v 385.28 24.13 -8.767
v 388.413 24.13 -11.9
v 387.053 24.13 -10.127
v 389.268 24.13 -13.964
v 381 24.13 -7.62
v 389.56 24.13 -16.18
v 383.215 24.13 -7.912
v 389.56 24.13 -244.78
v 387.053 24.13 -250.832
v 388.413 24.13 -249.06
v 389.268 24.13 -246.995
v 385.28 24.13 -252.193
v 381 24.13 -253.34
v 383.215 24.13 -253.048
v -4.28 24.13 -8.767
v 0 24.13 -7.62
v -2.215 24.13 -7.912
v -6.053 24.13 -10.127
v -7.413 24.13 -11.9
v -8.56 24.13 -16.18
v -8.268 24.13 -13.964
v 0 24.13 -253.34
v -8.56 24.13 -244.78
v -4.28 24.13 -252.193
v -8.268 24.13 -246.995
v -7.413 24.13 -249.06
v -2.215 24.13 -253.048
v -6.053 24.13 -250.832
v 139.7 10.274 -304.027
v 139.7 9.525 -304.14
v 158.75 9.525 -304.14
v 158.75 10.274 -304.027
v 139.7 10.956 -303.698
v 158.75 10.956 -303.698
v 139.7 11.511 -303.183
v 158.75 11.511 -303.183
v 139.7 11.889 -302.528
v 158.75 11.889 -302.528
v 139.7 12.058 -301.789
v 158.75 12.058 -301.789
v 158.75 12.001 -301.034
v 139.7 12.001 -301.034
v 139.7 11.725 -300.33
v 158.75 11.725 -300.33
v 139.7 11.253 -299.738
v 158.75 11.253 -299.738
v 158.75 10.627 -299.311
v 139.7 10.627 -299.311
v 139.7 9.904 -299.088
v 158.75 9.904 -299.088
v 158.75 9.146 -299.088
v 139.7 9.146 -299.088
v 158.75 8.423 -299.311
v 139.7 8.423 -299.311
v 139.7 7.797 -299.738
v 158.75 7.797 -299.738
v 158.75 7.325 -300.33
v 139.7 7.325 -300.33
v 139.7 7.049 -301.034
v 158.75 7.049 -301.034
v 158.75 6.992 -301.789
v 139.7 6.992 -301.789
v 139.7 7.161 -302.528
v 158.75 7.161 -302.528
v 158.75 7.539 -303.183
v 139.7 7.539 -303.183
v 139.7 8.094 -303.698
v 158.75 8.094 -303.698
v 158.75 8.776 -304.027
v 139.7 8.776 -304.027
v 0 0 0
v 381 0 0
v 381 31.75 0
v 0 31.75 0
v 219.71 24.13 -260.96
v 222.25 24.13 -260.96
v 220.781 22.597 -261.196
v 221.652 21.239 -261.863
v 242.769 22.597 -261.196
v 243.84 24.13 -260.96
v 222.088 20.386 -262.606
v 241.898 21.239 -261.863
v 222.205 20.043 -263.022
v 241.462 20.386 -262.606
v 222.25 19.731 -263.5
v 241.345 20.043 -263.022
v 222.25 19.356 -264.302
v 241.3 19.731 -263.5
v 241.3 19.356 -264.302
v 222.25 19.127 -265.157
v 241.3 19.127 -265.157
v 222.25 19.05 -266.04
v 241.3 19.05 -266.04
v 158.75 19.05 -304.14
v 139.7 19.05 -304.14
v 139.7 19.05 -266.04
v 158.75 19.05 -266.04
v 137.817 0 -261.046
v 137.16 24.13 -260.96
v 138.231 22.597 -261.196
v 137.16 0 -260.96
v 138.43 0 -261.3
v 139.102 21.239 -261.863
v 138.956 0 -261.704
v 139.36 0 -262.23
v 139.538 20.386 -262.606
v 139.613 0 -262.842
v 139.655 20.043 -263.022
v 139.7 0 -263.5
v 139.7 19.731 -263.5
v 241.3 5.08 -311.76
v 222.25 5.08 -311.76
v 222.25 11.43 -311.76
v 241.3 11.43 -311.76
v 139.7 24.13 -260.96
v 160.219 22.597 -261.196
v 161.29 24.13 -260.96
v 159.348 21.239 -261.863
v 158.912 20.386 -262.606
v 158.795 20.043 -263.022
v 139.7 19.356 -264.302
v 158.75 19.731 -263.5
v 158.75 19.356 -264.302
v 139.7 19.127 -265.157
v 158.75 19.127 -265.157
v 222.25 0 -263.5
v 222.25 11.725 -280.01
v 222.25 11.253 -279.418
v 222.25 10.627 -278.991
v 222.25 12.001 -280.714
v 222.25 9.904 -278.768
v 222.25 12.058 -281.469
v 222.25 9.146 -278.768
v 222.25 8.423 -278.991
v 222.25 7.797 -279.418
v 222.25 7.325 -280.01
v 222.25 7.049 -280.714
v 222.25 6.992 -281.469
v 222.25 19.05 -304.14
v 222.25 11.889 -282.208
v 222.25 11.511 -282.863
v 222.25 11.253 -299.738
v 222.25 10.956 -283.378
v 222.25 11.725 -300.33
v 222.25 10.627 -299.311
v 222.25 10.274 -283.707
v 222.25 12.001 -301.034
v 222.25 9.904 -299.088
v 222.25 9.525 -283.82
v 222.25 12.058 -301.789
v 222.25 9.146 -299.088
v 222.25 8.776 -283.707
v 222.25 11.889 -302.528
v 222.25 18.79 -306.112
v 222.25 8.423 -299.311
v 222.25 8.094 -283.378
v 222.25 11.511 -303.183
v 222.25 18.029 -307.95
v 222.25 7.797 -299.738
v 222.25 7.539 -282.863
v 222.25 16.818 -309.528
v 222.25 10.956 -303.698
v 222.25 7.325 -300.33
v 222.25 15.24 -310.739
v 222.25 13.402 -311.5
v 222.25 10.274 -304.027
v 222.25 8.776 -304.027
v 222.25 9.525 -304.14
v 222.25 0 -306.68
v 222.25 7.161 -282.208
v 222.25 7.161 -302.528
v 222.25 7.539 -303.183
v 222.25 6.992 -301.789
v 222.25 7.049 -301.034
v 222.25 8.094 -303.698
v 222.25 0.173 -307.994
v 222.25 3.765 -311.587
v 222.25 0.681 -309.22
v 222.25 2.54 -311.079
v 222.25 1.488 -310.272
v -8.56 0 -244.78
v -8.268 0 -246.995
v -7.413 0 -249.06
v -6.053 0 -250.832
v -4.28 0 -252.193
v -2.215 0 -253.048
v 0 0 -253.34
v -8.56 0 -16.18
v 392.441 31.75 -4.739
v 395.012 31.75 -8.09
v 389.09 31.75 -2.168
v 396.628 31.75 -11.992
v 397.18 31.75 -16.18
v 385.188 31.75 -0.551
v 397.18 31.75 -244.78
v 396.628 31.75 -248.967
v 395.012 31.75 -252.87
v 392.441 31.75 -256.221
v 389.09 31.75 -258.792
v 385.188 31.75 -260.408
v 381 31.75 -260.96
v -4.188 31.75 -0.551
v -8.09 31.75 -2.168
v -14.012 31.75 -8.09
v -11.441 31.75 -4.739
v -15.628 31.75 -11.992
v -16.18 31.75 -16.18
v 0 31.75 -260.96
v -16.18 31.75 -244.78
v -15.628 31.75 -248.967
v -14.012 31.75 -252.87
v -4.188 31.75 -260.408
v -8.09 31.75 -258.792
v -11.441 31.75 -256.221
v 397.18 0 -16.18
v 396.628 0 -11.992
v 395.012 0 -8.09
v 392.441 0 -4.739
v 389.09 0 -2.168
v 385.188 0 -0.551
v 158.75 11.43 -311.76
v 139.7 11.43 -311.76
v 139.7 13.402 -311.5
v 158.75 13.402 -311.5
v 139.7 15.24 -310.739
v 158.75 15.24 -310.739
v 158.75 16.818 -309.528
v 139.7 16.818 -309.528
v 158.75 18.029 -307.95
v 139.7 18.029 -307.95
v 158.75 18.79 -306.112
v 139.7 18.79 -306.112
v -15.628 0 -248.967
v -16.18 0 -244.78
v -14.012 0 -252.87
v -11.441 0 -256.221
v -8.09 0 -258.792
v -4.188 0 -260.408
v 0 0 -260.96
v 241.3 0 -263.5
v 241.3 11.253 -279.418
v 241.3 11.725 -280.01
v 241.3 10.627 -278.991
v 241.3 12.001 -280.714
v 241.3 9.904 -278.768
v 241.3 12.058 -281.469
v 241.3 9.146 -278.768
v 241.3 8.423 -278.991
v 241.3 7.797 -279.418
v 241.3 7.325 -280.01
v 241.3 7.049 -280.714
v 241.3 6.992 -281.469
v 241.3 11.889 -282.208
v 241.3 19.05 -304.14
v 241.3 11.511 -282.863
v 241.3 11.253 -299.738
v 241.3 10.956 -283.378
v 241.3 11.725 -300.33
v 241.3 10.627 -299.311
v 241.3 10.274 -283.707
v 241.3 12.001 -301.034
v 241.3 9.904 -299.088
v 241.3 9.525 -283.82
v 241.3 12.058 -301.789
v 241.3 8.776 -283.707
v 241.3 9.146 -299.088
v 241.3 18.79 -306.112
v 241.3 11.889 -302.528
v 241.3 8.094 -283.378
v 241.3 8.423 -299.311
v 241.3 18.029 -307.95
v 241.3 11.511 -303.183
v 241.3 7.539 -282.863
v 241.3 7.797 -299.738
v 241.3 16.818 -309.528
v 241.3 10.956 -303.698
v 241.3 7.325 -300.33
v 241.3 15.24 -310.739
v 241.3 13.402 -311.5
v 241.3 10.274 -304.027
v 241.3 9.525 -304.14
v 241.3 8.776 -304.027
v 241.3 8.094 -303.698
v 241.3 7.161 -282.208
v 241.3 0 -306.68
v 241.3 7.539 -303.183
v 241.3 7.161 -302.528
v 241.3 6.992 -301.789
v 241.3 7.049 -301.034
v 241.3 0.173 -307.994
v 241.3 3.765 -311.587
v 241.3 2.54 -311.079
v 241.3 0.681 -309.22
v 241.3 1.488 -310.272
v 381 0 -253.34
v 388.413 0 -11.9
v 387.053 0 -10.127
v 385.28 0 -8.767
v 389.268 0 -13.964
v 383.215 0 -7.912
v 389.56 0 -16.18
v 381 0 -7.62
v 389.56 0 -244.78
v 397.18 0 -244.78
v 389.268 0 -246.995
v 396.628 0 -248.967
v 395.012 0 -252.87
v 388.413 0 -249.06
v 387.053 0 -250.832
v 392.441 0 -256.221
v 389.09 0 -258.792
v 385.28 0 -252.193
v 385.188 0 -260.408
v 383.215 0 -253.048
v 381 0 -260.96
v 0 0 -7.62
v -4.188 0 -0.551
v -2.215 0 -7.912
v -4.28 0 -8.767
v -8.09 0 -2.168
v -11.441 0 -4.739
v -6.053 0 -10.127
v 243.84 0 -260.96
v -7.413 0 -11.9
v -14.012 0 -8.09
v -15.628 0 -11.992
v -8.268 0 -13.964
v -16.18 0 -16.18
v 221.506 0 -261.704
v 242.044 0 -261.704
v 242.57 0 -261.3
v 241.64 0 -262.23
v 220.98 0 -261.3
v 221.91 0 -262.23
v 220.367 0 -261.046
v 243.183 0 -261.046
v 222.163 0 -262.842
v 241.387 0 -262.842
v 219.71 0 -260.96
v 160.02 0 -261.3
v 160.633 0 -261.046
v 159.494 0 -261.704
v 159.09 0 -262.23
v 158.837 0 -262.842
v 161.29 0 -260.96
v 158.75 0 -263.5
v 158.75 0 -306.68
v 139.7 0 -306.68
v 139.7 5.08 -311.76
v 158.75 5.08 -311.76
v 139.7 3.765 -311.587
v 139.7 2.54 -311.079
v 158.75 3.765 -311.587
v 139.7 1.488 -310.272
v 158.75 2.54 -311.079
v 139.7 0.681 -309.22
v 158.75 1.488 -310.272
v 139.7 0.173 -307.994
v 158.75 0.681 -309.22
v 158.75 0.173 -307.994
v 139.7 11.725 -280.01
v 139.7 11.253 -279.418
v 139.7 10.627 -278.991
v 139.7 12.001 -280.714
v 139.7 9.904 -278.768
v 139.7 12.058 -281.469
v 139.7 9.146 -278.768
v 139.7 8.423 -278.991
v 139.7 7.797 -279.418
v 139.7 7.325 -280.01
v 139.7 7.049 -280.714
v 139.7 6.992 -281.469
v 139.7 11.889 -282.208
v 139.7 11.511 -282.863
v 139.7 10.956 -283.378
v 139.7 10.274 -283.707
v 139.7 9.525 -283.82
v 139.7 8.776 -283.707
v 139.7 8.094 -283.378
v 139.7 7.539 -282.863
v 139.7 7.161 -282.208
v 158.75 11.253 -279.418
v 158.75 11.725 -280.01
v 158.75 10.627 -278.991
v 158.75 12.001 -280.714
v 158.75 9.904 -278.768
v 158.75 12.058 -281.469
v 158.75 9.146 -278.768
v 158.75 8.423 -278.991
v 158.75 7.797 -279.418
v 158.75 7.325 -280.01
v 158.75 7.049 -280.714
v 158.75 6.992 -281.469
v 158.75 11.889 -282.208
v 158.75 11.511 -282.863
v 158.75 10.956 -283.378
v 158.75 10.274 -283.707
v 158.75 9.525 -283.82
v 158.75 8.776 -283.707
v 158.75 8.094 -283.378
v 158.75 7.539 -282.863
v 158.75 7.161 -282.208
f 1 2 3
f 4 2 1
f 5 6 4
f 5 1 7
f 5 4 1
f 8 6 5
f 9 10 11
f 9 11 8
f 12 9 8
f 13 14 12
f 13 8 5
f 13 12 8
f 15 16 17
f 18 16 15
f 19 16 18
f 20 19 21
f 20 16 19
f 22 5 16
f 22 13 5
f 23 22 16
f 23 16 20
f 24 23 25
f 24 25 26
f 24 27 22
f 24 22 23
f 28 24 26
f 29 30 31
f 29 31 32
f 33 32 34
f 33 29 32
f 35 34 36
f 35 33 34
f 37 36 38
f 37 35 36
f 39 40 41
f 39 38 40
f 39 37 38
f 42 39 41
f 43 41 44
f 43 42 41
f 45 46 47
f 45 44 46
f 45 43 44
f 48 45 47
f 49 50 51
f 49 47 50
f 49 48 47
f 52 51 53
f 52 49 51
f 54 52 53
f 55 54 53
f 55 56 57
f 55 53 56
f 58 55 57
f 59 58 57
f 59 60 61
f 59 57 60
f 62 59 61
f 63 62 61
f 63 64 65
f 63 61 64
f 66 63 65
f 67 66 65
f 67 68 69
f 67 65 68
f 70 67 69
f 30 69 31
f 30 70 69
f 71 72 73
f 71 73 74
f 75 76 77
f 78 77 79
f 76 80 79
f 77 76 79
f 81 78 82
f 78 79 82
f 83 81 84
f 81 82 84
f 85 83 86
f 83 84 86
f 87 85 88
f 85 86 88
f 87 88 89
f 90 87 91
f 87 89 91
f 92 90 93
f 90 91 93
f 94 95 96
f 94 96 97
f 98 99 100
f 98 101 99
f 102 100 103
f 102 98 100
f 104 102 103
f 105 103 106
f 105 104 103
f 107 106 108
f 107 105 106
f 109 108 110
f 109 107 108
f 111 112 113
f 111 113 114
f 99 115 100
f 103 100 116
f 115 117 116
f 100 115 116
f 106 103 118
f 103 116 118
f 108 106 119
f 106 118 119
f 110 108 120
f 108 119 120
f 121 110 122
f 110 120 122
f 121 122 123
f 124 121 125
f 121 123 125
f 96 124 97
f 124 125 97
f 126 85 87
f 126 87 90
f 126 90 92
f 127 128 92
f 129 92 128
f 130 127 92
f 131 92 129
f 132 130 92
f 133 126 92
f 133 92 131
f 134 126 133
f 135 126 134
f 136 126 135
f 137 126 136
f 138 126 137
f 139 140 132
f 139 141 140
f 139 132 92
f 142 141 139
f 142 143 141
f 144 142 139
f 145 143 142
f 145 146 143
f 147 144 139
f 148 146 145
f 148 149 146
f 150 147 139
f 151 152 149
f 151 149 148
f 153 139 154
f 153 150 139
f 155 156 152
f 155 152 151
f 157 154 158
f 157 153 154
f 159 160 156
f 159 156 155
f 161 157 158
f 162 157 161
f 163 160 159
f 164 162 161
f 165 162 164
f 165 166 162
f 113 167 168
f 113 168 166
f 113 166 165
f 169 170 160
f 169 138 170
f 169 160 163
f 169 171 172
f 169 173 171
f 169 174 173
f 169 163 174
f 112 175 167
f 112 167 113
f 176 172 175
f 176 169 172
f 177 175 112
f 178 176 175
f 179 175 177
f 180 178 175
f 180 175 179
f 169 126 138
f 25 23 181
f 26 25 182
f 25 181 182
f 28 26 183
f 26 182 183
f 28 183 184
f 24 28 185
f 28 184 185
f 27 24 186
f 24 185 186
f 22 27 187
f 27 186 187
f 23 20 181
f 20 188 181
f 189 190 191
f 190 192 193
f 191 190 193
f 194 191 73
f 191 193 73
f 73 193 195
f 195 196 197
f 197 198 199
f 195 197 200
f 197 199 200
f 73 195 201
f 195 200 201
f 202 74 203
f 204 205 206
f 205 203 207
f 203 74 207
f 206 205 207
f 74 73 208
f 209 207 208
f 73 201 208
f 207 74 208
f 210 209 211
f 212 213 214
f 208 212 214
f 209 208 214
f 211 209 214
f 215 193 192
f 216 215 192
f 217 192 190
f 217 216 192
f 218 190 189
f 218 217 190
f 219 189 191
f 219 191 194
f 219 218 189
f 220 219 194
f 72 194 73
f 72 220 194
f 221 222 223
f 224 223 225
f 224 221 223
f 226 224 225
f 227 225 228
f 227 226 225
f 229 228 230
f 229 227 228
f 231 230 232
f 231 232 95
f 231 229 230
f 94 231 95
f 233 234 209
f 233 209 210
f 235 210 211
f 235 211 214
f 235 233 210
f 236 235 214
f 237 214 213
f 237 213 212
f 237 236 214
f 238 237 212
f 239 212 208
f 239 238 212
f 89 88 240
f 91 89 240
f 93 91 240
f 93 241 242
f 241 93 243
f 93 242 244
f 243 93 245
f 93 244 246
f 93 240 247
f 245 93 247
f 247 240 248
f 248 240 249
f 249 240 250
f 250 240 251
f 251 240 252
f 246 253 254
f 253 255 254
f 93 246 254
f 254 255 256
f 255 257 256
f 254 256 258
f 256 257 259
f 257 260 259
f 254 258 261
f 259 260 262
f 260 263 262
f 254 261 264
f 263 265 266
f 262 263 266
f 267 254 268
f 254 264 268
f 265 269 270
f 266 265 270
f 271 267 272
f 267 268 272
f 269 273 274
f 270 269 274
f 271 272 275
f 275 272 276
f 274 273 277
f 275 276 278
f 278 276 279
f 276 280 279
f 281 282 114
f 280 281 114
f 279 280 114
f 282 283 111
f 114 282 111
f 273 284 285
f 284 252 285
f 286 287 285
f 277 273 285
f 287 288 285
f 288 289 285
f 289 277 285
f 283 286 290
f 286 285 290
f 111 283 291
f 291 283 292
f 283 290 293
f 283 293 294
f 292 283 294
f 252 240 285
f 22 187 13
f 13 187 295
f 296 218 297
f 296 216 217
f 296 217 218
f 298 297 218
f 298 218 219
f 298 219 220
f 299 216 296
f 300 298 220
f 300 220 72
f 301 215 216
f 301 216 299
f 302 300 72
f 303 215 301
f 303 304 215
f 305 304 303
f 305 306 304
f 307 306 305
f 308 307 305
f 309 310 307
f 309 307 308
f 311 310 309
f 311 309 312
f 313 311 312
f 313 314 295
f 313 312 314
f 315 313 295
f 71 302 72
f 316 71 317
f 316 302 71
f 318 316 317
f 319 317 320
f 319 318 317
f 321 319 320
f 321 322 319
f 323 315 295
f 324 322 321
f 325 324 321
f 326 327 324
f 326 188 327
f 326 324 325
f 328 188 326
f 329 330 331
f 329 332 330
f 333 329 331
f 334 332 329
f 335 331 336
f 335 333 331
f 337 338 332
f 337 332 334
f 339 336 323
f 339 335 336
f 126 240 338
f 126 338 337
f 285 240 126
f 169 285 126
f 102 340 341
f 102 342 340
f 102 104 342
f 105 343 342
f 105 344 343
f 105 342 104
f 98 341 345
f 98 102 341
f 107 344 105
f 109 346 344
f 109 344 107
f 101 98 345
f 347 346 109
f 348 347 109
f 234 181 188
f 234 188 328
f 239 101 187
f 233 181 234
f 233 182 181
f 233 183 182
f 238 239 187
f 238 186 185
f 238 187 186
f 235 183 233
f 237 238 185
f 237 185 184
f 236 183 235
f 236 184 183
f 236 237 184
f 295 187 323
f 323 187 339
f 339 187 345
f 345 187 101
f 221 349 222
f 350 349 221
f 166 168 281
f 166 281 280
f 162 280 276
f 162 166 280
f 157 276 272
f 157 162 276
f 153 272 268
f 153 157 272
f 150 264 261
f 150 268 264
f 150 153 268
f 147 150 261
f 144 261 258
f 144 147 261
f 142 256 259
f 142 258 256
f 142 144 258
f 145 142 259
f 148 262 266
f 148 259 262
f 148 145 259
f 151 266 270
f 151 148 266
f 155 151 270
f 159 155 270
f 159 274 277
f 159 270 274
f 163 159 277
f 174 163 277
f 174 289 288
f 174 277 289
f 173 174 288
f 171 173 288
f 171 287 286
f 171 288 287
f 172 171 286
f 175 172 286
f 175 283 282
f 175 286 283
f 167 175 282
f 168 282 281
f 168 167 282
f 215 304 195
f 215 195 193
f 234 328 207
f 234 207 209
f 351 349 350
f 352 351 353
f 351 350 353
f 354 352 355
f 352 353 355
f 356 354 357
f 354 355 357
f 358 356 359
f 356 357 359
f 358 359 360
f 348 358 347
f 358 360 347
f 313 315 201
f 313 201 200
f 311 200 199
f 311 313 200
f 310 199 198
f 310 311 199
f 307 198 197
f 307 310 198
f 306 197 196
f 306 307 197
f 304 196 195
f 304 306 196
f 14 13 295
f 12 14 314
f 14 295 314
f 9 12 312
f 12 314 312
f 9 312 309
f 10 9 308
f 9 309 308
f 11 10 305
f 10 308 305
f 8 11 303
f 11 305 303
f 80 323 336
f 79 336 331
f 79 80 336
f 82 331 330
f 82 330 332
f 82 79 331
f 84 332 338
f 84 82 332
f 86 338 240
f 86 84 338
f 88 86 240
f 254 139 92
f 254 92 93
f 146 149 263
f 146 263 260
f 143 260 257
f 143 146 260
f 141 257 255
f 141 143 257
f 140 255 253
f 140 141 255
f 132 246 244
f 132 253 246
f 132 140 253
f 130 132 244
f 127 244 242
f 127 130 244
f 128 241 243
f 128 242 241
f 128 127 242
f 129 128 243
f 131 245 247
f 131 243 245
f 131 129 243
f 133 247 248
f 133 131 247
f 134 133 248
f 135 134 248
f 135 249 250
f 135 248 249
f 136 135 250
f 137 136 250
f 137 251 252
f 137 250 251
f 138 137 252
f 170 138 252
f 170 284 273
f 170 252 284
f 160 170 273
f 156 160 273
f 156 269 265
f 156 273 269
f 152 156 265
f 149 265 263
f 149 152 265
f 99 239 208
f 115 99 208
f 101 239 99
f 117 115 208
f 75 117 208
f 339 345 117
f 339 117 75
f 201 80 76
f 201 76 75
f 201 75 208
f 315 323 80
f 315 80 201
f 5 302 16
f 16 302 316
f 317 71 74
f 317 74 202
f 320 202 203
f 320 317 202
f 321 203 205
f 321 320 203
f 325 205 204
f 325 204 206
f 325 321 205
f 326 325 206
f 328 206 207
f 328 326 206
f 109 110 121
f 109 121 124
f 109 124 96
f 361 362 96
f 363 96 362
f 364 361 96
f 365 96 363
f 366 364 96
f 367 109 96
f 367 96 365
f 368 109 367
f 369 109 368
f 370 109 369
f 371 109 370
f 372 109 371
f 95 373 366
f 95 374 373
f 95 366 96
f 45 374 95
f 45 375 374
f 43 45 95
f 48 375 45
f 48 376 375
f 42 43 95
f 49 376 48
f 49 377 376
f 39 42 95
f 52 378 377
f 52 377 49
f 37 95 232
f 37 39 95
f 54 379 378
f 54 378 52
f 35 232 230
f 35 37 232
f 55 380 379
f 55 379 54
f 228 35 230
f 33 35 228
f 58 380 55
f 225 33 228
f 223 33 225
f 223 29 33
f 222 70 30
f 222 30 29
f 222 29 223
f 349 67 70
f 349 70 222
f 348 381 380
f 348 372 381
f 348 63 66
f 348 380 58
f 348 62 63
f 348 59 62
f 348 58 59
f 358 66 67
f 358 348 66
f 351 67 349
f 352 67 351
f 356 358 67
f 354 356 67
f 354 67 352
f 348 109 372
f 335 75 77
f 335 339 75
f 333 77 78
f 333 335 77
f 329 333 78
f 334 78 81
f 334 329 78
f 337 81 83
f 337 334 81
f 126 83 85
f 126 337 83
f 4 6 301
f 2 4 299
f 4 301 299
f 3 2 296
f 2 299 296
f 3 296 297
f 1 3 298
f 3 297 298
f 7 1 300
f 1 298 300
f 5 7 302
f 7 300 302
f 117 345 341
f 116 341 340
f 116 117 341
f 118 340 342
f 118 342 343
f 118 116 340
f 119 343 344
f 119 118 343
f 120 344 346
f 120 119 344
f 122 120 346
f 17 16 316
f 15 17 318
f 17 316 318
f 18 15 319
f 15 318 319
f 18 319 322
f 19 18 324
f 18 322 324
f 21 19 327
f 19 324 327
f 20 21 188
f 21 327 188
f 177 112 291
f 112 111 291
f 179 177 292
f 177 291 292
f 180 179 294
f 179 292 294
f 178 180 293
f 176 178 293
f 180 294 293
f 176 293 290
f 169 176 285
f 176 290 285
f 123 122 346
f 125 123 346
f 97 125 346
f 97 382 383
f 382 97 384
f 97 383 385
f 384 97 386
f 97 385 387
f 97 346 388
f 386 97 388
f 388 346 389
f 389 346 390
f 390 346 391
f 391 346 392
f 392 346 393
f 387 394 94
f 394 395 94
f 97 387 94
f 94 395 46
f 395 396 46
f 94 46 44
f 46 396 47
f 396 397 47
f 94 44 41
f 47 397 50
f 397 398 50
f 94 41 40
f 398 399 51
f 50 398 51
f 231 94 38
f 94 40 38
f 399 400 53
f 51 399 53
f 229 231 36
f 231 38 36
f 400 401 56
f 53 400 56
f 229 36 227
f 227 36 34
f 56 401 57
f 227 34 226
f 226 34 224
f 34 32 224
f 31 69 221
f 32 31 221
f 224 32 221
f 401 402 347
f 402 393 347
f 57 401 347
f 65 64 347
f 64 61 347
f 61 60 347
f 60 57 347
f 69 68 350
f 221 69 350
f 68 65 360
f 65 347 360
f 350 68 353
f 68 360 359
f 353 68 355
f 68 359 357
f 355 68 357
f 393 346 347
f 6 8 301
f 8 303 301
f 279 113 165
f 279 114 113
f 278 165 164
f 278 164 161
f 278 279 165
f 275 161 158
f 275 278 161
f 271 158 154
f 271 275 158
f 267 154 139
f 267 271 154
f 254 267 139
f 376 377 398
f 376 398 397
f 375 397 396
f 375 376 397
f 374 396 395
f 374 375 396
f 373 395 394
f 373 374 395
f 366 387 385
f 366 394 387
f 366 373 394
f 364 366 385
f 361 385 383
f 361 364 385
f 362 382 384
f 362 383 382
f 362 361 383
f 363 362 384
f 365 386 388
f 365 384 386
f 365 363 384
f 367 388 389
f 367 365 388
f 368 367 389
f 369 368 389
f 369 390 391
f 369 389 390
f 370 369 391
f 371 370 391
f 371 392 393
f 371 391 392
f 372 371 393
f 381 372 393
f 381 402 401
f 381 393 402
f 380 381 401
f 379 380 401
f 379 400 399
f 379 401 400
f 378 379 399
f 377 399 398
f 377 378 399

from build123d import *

# Parameters (mm, degrees)
BOSS_EXTRUDE1_DEPTH     = 31.75
SHELL1_T                = -7.62
SKETCH1_5_W             = 101.6
SKETCH1_5_H             = 50.8
BOSS_EXTRUDE3_DEPTH     = 19.05
CUT_EXTRUDE2_DEPTH      = 506.280856772
CUT_EXTRUDE2_DEPTH_BACK = 506.280856772
SKETCH4_W               = 63.5
SKETCH4_H               = 50.8
FILLET5_R               = 7.62
FILLET6_R               = 5.08
FILLET7_R               = 7.62
FILLET8_R               = 5.08
FILLET9_R               = 5.08
FILLET10_R              = 5.08
FILLET11_R              = 2.54
FILLET12_R              = 2.54
FILLET13_R              = 2.54
FILLET14_R              = 2.54
CUT_EXTRUDE3_DEPTH      = 406.583478584
CUT_EXTRUDE3_DEPTH_BACK = 406.583478584
SKETCH5_R               = 2.54


with BuildPart() as part:
    # Sketch1 → Boss-Extrude1 (new body)
    with BuildSketch(Plane(origin=(0, 0, 0), x_dir=(1, 0, 0), z_dir=(0, 1, 0))):
        with BuildLine():
            ThreePointArc((-16.1798, 16.1798), (-11.440846298, 4.738953702), (0, 0))
            Line((0, 0), (381, 0))
            ThreePointArc((381, 0), (392.440846298, 4.738953702), (397.1798, 16.1798))
            Line((397.1798, 16.1798), (397.1798, 244.7798))
            ThreePointArc((397.1798, 244.7798), (392.440846298, 256.220646298), (381, 260.9596))
            Line((381, 260.9596), (241.3, 260.9596))
            Line((241.3, 260.9596), (139.7, 260.9596))
            Line((139.7, 260.9596), (0, 260.9596))
            ThreePointArc((0, 260.9596), (-11.440846298, 256.220646298), (-16.1798, 244.7798))
            Line((-16.1798, 244.7798), (-16.1798, 16.1798))
        make_face()
    extrude(amount=BOSS_EXTRUDE1_DEPTH)

    # Shell1
    shell1_openings = [part.faces().sort_by_distance(p)[0] for p in [
        (190.5, 0, -130.4798),
    ]]
    offset(amount=SHELL1_T, openings=shell1_openings, kind=Kind.INTERSECTION)

    # Sketch1<5> → Boss-Extrude3 (add)
    with BuildSketch(Plane(origin=(0, 0, 0), x_dir=(1, 0, 0), z_dir=(0, 1, 0))):
        with Locations((190.5, 286.3596)):
            Rectangle(SKETCH1_5_W, SKETCH1_5_H)
    extrude(amount=BOSS_EXTRUDE3_DEPTH)

    # Sketch4 → Cut-Extrude2 (cut, two sides: drawn at the far end of the back side and taken through both)
    with BuildSketch(Plane(origin=(0, 19.05, 0), x_dir=(1, 0, 0), z_dir=(0, 1, 0)).offset(-CUT_EXTRUDE2_DEPTH_BACK)):
        with Locations((190.5, 286.3596)):
            Rectangle(SKETCH4_W, SKETCH4_H)
    extrude(amount=CUT_EXTRUDE2_DEPTH + CUT_EXTRUDE2_DEPTH_BACK, mode=Mode.SUBTRACT)

    # Fillet5
    fillet5_edges = [part.edges().sort_by_distance(p)[0] for p in [
        (231.775, 19.05, -311.7596),
    ]]
    fillet(fillet5_edges, radius=FILLET5_R)

    # Fillet6
    fillet6_edges = [part.edges().sort_by_distance(p)[0] for p in [
        (231.775, 0, -311.7596),
    ]]
    fillet(fillet6_edges, radius=FILLET6_R)

    # Fillet7
    fillet7_edges = [part.edges().sort_by_distance(p)[0] for p in [
        (149.225, 19.05, -311.7596),
    ]]
    fillet(fillet7_edges, radius=FILLET7_R)

    # Fillet8
    fillet8_edges = [part.edges().sort_by_distance(p)[0] for p in [
        (149.225, 0, -311.7596),
    ]]
    fillet(fillet8_edges, radius=FILLET8_R)

    # Fillet9
    fillet9_edges = [part.edges().sort_by_distance(p)[0] for p in [
        (231.775, 19.05, -260.9596),
    ]]
    fillet(fillet9_edges, radius=FILLET9_R)

    # Fillet10
    fillet10_edges = [part.edges().sort_by_distance(p)[0] for p in [
        (149.225, 19.05, -260.9596),
    ]]
    fillet(fillet10_edges, radius=FILLET10_R)

    # Fillet11
    fillet11_edges = [part.edges().sort_by_distance(p)[0] for p in [
        (241.3, 12.065, -260.9596),
    ]]
    fillet(fillet11_edges, radius=FILLET11_R)

    # Fillet12
    fillet12_edges = [part.edges().sort_by_distance(p)[0] for p in [
        (222.25, 12.065, -260.9596),
    ]]
    fillet(fillet12_edges, radius=FILLET12_R)

    # Fillet13
    fillet13_edges = [part.edges().sort_by_distance(p)[0] for p in [
        (158.75, 12.065, -260.9596),
    ]]
    fillet(fillet13_edges, radius=FILLET13_R)

    # Fillet14
    fillet14_edges = [part.edges().sort_by_distance(p)[0] for p in [
        (139.7, 12.065, -260.9596),
    ]]
    fillet(fillet14_edges, radius=FILLET14_R)

    # Sketch5 → Cut-Extrude3 (cut, two sides: drawn at the far end of the back side and taken through both)
    with BuildSketch(Plane(origin=(241.3, 0, 0), x_dir=(0, 0, -1), z_dir=(1, 0, 0)).offset(-CUT_EXTRUDE3_DEPTH_BACK)):
        with Locations((301.5996, 9.525)):
            Circle(SKETCH5_R)
        with Locations((281.2796, 9.525)):
            Circle(SKETCH5_R)
    extrude(amount=CUT_EXTRUDE3_DEPTH + CUT_EXTRUDE3_DEPTH_BACK, mode=Mode.SUBTRACT)


solid = part.part
